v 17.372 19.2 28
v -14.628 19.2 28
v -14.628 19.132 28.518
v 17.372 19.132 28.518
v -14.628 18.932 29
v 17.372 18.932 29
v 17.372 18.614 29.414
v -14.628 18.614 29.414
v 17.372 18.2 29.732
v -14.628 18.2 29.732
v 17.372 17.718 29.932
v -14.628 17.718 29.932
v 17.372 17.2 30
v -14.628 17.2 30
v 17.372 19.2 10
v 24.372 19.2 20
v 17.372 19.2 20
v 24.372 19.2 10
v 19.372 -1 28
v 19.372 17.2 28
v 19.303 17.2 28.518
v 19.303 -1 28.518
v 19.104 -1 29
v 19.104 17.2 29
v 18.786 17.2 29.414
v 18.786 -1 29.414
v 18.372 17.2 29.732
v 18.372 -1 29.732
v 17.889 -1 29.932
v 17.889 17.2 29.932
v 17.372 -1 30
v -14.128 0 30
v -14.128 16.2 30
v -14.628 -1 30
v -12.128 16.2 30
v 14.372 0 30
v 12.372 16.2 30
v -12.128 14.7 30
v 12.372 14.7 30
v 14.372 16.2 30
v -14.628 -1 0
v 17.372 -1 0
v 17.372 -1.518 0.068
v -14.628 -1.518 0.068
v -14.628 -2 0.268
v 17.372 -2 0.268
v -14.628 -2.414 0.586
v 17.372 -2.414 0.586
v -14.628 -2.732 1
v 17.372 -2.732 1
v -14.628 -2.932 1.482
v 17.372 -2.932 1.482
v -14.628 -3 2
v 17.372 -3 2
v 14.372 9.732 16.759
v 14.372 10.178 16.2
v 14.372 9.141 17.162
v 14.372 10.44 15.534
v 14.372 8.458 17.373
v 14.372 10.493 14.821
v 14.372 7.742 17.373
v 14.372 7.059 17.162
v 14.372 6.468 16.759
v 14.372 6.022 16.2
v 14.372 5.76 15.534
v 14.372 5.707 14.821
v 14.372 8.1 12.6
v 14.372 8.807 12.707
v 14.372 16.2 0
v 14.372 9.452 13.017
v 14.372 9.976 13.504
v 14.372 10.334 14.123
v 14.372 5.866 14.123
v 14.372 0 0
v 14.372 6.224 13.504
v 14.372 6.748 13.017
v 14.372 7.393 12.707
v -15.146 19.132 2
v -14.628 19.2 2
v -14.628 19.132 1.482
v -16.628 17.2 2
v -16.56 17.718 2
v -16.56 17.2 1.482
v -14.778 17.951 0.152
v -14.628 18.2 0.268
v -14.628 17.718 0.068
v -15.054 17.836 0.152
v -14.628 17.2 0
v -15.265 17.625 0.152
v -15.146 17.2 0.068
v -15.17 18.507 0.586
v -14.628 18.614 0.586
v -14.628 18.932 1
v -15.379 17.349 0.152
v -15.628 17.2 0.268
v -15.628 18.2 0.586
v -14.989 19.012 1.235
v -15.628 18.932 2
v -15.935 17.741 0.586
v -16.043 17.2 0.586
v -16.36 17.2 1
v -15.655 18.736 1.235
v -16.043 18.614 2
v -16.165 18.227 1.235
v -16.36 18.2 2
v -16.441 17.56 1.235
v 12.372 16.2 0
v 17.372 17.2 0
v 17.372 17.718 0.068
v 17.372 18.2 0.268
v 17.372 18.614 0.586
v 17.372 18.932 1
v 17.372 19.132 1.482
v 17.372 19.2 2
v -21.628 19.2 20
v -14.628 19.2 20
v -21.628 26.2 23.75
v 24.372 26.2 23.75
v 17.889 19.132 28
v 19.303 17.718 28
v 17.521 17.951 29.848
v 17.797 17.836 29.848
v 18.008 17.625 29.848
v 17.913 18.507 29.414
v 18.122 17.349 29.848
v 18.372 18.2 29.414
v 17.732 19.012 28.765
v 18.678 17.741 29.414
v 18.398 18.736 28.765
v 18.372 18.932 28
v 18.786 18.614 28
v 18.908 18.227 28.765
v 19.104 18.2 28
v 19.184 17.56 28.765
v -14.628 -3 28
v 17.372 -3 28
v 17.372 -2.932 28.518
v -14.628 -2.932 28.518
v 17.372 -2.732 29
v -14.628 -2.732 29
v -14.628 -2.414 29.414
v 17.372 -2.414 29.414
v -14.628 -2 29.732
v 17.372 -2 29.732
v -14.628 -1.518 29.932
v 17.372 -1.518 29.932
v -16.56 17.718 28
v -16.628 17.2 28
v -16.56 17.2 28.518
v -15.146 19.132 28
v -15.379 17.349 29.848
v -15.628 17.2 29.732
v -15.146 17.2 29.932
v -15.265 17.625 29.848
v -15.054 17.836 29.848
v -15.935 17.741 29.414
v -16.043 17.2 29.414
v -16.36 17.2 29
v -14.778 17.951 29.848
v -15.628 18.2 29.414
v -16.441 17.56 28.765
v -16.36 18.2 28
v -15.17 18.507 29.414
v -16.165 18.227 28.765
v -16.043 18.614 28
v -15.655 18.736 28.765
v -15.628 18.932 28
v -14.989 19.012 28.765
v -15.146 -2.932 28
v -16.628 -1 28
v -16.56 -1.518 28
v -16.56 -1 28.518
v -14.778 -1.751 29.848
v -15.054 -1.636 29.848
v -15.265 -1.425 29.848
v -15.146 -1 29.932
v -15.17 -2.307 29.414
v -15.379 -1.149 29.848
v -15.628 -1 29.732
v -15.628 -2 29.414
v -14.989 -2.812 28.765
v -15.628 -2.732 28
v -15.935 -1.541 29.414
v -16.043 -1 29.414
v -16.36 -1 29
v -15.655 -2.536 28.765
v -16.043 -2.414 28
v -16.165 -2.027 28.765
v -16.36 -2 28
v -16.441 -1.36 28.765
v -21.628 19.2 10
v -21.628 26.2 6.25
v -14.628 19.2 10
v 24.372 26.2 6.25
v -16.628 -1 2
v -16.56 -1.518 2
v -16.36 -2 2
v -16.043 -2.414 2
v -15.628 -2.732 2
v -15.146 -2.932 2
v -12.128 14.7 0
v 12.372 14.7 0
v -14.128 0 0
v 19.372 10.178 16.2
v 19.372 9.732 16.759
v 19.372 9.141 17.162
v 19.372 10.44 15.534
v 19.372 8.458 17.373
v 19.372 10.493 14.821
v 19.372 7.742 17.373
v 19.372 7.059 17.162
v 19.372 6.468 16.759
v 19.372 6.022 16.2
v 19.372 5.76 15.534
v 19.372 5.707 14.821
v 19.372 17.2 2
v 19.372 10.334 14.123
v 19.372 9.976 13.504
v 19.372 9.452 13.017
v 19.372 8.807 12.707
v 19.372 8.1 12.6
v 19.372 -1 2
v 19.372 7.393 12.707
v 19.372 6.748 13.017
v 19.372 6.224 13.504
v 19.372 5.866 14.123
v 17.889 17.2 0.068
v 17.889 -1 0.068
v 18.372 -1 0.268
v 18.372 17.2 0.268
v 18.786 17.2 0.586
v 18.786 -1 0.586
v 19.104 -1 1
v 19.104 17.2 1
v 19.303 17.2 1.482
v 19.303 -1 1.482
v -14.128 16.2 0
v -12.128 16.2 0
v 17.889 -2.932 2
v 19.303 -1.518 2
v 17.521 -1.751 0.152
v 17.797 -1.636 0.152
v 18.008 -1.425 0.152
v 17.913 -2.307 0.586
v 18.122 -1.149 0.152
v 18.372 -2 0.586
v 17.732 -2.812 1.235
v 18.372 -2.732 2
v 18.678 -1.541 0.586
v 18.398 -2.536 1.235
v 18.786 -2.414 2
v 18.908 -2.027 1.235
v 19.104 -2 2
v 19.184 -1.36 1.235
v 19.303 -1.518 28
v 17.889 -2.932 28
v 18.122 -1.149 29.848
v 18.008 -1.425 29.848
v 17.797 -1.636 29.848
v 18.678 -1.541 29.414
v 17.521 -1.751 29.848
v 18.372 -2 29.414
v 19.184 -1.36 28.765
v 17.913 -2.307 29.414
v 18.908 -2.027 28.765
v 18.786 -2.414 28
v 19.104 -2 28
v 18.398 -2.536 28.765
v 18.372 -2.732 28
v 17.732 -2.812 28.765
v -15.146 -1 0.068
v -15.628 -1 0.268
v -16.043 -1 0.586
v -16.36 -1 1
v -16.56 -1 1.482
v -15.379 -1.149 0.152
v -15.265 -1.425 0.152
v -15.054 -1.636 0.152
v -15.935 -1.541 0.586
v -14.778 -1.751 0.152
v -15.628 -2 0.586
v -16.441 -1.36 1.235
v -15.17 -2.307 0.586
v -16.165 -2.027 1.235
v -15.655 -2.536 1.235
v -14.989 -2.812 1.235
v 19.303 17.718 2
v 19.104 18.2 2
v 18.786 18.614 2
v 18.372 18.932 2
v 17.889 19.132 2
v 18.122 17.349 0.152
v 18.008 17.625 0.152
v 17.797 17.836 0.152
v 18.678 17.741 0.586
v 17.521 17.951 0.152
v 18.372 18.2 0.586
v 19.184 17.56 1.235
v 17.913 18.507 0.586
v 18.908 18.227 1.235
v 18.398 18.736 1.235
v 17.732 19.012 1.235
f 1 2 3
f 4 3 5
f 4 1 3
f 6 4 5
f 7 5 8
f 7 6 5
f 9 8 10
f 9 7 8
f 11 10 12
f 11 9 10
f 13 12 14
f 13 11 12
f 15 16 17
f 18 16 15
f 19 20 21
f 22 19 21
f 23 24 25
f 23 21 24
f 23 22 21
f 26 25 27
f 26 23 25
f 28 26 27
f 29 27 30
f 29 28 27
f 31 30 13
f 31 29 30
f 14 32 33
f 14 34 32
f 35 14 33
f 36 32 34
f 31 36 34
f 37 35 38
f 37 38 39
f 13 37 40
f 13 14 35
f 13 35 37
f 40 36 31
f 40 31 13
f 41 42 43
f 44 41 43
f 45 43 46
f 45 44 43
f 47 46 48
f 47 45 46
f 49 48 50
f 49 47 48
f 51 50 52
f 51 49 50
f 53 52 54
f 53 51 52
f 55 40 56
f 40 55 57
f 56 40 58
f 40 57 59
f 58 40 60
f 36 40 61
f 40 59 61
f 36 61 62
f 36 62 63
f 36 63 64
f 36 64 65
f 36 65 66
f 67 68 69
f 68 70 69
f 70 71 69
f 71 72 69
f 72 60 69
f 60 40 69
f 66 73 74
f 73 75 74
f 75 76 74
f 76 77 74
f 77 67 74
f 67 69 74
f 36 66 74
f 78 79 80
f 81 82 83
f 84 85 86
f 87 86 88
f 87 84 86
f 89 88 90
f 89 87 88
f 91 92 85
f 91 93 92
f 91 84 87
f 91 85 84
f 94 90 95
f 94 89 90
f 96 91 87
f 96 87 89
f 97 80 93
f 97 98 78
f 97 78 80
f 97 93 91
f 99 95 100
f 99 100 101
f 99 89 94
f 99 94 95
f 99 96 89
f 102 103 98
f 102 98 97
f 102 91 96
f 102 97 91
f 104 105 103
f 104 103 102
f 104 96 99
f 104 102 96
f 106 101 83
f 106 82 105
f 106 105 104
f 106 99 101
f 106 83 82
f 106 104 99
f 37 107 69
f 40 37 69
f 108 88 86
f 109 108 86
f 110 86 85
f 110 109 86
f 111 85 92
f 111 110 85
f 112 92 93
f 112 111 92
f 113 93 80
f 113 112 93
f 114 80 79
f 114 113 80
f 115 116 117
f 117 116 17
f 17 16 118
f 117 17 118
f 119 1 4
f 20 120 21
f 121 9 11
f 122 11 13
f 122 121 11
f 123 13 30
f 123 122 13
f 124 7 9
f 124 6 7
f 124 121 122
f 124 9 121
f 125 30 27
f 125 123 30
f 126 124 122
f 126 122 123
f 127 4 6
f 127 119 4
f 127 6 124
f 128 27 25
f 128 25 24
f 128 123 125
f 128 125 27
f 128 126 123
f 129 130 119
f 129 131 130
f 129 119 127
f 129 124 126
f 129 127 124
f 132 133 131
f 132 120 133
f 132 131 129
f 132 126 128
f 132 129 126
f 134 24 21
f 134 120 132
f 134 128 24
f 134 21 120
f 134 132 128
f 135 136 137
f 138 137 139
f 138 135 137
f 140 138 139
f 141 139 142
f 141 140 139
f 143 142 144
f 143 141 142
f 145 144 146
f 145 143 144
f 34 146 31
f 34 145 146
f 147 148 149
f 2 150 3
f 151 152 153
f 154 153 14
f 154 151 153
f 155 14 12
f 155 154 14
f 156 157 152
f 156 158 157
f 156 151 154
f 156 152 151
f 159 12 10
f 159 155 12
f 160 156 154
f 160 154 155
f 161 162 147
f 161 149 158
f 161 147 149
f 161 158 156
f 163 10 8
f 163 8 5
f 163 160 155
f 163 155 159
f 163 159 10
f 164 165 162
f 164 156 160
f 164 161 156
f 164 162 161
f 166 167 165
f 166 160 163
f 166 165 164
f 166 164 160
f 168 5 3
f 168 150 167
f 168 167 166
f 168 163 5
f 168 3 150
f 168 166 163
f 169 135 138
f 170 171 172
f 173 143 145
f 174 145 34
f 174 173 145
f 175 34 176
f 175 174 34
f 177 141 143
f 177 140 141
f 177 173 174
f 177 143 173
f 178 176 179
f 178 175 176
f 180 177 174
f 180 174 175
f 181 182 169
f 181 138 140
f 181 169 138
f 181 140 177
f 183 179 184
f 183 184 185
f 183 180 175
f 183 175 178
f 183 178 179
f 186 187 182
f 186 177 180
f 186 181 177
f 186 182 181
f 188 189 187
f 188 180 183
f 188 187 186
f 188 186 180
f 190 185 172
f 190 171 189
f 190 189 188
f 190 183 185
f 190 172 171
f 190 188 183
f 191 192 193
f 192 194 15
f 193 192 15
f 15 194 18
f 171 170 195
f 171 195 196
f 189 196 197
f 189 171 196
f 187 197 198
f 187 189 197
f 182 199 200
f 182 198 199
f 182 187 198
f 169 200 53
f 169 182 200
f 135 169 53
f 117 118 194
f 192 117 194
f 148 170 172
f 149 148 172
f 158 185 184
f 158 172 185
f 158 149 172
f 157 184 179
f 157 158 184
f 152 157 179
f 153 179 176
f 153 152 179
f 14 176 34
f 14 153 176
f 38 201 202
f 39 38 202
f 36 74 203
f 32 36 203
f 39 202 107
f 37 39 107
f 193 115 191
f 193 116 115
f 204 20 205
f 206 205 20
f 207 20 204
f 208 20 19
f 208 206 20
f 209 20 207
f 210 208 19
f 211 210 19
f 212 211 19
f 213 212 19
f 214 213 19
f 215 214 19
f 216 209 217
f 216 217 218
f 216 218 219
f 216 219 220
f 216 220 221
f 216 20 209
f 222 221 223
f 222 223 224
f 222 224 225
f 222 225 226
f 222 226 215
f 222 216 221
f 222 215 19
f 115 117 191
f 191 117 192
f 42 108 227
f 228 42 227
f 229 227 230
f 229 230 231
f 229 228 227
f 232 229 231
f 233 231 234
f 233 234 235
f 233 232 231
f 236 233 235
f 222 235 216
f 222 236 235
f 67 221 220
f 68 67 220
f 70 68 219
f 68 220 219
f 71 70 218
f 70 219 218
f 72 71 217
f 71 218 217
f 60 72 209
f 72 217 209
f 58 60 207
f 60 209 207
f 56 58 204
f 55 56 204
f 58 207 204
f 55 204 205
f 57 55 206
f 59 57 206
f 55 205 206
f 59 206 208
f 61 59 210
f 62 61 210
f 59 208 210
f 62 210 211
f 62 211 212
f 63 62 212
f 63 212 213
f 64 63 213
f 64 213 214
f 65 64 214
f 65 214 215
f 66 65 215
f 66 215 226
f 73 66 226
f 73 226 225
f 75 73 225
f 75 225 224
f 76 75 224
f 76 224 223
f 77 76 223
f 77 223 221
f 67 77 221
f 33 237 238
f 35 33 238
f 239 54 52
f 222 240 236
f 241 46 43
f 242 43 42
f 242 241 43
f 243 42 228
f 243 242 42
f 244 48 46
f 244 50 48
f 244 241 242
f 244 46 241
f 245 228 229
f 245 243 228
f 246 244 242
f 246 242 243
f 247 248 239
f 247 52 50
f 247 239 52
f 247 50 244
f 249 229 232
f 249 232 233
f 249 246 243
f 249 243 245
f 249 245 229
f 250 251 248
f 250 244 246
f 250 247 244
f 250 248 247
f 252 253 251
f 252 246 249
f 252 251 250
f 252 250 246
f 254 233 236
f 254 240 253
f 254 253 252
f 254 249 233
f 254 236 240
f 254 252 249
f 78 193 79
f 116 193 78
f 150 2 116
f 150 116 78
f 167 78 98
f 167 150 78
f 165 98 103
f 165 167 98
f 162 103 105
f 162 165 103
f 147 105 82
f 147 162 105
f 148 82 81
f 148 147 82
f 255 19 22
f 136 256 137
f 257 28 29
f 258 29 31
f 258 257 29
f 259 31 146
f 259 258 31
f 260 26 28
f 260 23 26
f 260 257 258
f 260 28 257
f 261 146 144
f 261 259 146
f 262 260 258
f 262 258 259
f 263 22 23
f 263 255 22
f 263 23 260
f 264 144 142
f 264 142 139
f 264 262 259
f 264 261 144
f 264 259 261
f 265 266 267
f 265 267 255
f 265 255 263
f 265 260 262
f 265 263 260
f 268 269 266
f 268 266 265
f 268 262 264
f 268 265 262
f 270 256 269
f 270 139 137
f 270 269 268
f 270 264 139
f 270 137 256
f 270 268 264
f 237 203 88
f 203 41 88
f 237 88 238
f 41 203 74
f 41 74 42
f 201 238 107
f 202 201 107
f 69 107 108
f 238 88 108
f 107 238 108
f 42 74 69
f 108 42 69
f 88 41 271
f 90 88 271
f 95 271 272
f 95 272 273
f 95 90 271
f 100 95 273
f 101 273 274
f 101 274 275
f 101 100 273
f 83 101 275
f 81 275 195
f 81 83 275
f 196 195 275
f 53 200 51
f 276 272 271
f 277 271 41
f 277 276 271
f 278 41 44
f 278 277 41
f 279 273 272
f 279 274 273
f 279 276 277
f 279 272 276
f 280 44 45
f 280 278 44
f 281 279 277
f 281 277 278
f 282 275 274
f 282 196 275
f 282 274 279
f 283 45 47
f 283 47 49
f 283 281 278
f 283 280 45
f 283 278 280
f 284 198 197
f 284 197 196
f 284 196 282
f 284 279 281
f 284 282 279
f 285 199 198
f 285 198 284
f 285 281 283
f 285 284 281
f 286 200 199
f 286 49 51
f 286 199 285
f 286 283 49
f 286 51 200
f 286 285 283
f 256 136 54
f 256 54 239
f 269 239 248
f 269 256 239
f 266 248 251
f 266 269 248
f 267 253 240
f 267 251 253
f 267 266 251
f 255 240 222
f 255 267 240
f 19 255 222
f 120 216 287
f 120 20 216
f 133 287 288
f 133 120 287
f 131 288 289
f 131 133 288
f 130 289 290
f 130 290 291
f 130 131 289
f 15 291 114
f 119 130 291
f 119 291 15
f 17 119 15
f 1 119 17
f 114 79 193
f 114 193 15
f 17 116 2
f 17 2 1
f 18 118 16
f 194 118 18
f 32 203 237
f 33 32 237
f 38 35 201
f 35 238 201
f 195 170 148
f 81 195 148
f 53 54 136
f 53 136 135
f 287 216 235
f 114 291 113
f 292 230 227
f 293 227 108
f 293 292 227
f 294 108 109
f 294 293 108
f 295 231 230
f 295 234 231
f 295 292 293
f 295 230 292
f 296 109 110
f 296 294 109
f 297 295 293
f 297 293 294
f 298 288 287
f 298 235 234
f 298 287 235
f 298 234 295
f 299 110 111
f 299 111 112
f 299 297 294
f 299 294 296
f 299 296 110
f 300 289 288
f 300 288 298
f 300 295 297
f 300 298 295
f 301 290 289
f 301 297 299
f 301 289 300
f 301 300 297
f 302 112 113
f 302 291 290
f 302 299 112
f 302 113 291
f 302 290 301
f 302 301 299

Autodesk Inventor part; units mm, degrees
ref_plane "YZ Plane" through (0, 0, 0) normal (1, 0, 0) x (0, 1, 0)
ref_plane "XZ Plane" through (0, 0, 0) normal (0, 1, 0) x (-1, 0, 0)
ref_plane "XY Plane" through (0, 0, 0) normal (0, 0, 1) x (1, 0, 0)
sketch "Skizze1" plane through (0, 0, 0) normal (0, 0, 1) x (1, 0, 0)
  line L0 (-14.1284, 0) -> (-14.1284, 16.2)
  line L1 (-14.1284, 16.2) -> (-12.1284, 16.2)
  line L2 (-12.1284, 16.2) -> (-12.1284, 1.6)
  line L3 (-12.1284, 1.6) -> (12.3716, 1.6)
  line L4 (12.3716, 1.6) -> (12.3716, 16.2)
  line L5 (12.3716, 16.2) -> (14.3716, 16.2)
  line L6 (14.3716, 16.2) -> (14.3716, 0)
  line L7 (14.3716, 0) -> (-14.1284, 0)
  line L8 (-16.6284, 19.2) -> (19.3716, 19.2)
  line L9 (19.3716, 19.2) -> (19.3716, -3)
  line L10 (19.3716, -3) -> (-16.6284, -3)
  line L11 (-16.6284, -3) -> (-16.6284, 19.2)
  line L12 (-12.1284, 14.7) -> (12.3716, 14.7)
  point P0 (0, 0)
  dimension "d1" = 2
  dimension "d3" = 2
  dimension "d4" = 1.6
  dimension "d5" = 3
  dimension "d7" = 2.5
  dimension "d8" = 5
  dimension "d9" = 1.5
  dimension "d26" = 3
  dimension "d27" = 28.5
  dimension "d28" = 16.2
extrude "Extrusion1" add sketch "Skizze1" along normal blind 30
fillet "Rundung1" radius 2 12 edges at (19.3716, 19.2, 15) (19.3716, -3, 15) (-16.6284, -3, 15) (-16.6284, 19.2, 15) (1.3716, 19.2, 30) (-16.6284, 8.1, 30) (1.3716, -3, 30) (19.3716, 8.1, 30) (19.3716, 8.1, 0) (1.3716, -3, 0) (1.3716, 19.2, 0) (-16.6284, 8.1, 0)
sketch "Skizze2" plane through (19.3716, -1, 28) normal (1, 0, 0) x (0, 0, -1)
  line L0 (0, 20.2) -> (26, 20.2) projected
  line L1 (8, 20.2) -> (4.25, 27.2)
  line L2 (4.25, 27.2) -> (21.75, 27.2)
  line L3 (21.75, 27.2) -> (18, 20.2)
  line L4 (28, 0) -> (28, 18.2) projected
  point P0 (28, 1)
  dimension "d13" = 10
  dimension "d15" = 7
  dimension "d16" = 3.75
  dimension "d17" = 3.75
  dimension "d18" = 17.5
  dimension "d19" = 10
extrude "Extrusion2" add sketch "Skizze2" against normal blind 41 and the other way blind 5
sketch "Skizze5" plane through (19.3716, -1, 28) normal (1, 0, 0) x (0, 0, -1)
  circle A0 centre (13, 9.1) radius 2.4
  line L0 (13, 9.1) -> (-2, 9.1)
  line L1 (-2, 18.2) -> (-2, 0) projected
  line L2 (13, 9.1) -> (13, 20.2)
  line L3 (8, 20.2) -> (18, 20.2) projected
  line L4 (13, 9.1) -> (28, 9.1)
  point P0 (28, 1)
  dimension "d31" = 4.8
  dimension "d32" = 90
  dimension "d35" = 15
extrude "Extrusion5" cut sketch "Skizze5" against normal blind 10
properties part number "7.2 Schienenläufer"
